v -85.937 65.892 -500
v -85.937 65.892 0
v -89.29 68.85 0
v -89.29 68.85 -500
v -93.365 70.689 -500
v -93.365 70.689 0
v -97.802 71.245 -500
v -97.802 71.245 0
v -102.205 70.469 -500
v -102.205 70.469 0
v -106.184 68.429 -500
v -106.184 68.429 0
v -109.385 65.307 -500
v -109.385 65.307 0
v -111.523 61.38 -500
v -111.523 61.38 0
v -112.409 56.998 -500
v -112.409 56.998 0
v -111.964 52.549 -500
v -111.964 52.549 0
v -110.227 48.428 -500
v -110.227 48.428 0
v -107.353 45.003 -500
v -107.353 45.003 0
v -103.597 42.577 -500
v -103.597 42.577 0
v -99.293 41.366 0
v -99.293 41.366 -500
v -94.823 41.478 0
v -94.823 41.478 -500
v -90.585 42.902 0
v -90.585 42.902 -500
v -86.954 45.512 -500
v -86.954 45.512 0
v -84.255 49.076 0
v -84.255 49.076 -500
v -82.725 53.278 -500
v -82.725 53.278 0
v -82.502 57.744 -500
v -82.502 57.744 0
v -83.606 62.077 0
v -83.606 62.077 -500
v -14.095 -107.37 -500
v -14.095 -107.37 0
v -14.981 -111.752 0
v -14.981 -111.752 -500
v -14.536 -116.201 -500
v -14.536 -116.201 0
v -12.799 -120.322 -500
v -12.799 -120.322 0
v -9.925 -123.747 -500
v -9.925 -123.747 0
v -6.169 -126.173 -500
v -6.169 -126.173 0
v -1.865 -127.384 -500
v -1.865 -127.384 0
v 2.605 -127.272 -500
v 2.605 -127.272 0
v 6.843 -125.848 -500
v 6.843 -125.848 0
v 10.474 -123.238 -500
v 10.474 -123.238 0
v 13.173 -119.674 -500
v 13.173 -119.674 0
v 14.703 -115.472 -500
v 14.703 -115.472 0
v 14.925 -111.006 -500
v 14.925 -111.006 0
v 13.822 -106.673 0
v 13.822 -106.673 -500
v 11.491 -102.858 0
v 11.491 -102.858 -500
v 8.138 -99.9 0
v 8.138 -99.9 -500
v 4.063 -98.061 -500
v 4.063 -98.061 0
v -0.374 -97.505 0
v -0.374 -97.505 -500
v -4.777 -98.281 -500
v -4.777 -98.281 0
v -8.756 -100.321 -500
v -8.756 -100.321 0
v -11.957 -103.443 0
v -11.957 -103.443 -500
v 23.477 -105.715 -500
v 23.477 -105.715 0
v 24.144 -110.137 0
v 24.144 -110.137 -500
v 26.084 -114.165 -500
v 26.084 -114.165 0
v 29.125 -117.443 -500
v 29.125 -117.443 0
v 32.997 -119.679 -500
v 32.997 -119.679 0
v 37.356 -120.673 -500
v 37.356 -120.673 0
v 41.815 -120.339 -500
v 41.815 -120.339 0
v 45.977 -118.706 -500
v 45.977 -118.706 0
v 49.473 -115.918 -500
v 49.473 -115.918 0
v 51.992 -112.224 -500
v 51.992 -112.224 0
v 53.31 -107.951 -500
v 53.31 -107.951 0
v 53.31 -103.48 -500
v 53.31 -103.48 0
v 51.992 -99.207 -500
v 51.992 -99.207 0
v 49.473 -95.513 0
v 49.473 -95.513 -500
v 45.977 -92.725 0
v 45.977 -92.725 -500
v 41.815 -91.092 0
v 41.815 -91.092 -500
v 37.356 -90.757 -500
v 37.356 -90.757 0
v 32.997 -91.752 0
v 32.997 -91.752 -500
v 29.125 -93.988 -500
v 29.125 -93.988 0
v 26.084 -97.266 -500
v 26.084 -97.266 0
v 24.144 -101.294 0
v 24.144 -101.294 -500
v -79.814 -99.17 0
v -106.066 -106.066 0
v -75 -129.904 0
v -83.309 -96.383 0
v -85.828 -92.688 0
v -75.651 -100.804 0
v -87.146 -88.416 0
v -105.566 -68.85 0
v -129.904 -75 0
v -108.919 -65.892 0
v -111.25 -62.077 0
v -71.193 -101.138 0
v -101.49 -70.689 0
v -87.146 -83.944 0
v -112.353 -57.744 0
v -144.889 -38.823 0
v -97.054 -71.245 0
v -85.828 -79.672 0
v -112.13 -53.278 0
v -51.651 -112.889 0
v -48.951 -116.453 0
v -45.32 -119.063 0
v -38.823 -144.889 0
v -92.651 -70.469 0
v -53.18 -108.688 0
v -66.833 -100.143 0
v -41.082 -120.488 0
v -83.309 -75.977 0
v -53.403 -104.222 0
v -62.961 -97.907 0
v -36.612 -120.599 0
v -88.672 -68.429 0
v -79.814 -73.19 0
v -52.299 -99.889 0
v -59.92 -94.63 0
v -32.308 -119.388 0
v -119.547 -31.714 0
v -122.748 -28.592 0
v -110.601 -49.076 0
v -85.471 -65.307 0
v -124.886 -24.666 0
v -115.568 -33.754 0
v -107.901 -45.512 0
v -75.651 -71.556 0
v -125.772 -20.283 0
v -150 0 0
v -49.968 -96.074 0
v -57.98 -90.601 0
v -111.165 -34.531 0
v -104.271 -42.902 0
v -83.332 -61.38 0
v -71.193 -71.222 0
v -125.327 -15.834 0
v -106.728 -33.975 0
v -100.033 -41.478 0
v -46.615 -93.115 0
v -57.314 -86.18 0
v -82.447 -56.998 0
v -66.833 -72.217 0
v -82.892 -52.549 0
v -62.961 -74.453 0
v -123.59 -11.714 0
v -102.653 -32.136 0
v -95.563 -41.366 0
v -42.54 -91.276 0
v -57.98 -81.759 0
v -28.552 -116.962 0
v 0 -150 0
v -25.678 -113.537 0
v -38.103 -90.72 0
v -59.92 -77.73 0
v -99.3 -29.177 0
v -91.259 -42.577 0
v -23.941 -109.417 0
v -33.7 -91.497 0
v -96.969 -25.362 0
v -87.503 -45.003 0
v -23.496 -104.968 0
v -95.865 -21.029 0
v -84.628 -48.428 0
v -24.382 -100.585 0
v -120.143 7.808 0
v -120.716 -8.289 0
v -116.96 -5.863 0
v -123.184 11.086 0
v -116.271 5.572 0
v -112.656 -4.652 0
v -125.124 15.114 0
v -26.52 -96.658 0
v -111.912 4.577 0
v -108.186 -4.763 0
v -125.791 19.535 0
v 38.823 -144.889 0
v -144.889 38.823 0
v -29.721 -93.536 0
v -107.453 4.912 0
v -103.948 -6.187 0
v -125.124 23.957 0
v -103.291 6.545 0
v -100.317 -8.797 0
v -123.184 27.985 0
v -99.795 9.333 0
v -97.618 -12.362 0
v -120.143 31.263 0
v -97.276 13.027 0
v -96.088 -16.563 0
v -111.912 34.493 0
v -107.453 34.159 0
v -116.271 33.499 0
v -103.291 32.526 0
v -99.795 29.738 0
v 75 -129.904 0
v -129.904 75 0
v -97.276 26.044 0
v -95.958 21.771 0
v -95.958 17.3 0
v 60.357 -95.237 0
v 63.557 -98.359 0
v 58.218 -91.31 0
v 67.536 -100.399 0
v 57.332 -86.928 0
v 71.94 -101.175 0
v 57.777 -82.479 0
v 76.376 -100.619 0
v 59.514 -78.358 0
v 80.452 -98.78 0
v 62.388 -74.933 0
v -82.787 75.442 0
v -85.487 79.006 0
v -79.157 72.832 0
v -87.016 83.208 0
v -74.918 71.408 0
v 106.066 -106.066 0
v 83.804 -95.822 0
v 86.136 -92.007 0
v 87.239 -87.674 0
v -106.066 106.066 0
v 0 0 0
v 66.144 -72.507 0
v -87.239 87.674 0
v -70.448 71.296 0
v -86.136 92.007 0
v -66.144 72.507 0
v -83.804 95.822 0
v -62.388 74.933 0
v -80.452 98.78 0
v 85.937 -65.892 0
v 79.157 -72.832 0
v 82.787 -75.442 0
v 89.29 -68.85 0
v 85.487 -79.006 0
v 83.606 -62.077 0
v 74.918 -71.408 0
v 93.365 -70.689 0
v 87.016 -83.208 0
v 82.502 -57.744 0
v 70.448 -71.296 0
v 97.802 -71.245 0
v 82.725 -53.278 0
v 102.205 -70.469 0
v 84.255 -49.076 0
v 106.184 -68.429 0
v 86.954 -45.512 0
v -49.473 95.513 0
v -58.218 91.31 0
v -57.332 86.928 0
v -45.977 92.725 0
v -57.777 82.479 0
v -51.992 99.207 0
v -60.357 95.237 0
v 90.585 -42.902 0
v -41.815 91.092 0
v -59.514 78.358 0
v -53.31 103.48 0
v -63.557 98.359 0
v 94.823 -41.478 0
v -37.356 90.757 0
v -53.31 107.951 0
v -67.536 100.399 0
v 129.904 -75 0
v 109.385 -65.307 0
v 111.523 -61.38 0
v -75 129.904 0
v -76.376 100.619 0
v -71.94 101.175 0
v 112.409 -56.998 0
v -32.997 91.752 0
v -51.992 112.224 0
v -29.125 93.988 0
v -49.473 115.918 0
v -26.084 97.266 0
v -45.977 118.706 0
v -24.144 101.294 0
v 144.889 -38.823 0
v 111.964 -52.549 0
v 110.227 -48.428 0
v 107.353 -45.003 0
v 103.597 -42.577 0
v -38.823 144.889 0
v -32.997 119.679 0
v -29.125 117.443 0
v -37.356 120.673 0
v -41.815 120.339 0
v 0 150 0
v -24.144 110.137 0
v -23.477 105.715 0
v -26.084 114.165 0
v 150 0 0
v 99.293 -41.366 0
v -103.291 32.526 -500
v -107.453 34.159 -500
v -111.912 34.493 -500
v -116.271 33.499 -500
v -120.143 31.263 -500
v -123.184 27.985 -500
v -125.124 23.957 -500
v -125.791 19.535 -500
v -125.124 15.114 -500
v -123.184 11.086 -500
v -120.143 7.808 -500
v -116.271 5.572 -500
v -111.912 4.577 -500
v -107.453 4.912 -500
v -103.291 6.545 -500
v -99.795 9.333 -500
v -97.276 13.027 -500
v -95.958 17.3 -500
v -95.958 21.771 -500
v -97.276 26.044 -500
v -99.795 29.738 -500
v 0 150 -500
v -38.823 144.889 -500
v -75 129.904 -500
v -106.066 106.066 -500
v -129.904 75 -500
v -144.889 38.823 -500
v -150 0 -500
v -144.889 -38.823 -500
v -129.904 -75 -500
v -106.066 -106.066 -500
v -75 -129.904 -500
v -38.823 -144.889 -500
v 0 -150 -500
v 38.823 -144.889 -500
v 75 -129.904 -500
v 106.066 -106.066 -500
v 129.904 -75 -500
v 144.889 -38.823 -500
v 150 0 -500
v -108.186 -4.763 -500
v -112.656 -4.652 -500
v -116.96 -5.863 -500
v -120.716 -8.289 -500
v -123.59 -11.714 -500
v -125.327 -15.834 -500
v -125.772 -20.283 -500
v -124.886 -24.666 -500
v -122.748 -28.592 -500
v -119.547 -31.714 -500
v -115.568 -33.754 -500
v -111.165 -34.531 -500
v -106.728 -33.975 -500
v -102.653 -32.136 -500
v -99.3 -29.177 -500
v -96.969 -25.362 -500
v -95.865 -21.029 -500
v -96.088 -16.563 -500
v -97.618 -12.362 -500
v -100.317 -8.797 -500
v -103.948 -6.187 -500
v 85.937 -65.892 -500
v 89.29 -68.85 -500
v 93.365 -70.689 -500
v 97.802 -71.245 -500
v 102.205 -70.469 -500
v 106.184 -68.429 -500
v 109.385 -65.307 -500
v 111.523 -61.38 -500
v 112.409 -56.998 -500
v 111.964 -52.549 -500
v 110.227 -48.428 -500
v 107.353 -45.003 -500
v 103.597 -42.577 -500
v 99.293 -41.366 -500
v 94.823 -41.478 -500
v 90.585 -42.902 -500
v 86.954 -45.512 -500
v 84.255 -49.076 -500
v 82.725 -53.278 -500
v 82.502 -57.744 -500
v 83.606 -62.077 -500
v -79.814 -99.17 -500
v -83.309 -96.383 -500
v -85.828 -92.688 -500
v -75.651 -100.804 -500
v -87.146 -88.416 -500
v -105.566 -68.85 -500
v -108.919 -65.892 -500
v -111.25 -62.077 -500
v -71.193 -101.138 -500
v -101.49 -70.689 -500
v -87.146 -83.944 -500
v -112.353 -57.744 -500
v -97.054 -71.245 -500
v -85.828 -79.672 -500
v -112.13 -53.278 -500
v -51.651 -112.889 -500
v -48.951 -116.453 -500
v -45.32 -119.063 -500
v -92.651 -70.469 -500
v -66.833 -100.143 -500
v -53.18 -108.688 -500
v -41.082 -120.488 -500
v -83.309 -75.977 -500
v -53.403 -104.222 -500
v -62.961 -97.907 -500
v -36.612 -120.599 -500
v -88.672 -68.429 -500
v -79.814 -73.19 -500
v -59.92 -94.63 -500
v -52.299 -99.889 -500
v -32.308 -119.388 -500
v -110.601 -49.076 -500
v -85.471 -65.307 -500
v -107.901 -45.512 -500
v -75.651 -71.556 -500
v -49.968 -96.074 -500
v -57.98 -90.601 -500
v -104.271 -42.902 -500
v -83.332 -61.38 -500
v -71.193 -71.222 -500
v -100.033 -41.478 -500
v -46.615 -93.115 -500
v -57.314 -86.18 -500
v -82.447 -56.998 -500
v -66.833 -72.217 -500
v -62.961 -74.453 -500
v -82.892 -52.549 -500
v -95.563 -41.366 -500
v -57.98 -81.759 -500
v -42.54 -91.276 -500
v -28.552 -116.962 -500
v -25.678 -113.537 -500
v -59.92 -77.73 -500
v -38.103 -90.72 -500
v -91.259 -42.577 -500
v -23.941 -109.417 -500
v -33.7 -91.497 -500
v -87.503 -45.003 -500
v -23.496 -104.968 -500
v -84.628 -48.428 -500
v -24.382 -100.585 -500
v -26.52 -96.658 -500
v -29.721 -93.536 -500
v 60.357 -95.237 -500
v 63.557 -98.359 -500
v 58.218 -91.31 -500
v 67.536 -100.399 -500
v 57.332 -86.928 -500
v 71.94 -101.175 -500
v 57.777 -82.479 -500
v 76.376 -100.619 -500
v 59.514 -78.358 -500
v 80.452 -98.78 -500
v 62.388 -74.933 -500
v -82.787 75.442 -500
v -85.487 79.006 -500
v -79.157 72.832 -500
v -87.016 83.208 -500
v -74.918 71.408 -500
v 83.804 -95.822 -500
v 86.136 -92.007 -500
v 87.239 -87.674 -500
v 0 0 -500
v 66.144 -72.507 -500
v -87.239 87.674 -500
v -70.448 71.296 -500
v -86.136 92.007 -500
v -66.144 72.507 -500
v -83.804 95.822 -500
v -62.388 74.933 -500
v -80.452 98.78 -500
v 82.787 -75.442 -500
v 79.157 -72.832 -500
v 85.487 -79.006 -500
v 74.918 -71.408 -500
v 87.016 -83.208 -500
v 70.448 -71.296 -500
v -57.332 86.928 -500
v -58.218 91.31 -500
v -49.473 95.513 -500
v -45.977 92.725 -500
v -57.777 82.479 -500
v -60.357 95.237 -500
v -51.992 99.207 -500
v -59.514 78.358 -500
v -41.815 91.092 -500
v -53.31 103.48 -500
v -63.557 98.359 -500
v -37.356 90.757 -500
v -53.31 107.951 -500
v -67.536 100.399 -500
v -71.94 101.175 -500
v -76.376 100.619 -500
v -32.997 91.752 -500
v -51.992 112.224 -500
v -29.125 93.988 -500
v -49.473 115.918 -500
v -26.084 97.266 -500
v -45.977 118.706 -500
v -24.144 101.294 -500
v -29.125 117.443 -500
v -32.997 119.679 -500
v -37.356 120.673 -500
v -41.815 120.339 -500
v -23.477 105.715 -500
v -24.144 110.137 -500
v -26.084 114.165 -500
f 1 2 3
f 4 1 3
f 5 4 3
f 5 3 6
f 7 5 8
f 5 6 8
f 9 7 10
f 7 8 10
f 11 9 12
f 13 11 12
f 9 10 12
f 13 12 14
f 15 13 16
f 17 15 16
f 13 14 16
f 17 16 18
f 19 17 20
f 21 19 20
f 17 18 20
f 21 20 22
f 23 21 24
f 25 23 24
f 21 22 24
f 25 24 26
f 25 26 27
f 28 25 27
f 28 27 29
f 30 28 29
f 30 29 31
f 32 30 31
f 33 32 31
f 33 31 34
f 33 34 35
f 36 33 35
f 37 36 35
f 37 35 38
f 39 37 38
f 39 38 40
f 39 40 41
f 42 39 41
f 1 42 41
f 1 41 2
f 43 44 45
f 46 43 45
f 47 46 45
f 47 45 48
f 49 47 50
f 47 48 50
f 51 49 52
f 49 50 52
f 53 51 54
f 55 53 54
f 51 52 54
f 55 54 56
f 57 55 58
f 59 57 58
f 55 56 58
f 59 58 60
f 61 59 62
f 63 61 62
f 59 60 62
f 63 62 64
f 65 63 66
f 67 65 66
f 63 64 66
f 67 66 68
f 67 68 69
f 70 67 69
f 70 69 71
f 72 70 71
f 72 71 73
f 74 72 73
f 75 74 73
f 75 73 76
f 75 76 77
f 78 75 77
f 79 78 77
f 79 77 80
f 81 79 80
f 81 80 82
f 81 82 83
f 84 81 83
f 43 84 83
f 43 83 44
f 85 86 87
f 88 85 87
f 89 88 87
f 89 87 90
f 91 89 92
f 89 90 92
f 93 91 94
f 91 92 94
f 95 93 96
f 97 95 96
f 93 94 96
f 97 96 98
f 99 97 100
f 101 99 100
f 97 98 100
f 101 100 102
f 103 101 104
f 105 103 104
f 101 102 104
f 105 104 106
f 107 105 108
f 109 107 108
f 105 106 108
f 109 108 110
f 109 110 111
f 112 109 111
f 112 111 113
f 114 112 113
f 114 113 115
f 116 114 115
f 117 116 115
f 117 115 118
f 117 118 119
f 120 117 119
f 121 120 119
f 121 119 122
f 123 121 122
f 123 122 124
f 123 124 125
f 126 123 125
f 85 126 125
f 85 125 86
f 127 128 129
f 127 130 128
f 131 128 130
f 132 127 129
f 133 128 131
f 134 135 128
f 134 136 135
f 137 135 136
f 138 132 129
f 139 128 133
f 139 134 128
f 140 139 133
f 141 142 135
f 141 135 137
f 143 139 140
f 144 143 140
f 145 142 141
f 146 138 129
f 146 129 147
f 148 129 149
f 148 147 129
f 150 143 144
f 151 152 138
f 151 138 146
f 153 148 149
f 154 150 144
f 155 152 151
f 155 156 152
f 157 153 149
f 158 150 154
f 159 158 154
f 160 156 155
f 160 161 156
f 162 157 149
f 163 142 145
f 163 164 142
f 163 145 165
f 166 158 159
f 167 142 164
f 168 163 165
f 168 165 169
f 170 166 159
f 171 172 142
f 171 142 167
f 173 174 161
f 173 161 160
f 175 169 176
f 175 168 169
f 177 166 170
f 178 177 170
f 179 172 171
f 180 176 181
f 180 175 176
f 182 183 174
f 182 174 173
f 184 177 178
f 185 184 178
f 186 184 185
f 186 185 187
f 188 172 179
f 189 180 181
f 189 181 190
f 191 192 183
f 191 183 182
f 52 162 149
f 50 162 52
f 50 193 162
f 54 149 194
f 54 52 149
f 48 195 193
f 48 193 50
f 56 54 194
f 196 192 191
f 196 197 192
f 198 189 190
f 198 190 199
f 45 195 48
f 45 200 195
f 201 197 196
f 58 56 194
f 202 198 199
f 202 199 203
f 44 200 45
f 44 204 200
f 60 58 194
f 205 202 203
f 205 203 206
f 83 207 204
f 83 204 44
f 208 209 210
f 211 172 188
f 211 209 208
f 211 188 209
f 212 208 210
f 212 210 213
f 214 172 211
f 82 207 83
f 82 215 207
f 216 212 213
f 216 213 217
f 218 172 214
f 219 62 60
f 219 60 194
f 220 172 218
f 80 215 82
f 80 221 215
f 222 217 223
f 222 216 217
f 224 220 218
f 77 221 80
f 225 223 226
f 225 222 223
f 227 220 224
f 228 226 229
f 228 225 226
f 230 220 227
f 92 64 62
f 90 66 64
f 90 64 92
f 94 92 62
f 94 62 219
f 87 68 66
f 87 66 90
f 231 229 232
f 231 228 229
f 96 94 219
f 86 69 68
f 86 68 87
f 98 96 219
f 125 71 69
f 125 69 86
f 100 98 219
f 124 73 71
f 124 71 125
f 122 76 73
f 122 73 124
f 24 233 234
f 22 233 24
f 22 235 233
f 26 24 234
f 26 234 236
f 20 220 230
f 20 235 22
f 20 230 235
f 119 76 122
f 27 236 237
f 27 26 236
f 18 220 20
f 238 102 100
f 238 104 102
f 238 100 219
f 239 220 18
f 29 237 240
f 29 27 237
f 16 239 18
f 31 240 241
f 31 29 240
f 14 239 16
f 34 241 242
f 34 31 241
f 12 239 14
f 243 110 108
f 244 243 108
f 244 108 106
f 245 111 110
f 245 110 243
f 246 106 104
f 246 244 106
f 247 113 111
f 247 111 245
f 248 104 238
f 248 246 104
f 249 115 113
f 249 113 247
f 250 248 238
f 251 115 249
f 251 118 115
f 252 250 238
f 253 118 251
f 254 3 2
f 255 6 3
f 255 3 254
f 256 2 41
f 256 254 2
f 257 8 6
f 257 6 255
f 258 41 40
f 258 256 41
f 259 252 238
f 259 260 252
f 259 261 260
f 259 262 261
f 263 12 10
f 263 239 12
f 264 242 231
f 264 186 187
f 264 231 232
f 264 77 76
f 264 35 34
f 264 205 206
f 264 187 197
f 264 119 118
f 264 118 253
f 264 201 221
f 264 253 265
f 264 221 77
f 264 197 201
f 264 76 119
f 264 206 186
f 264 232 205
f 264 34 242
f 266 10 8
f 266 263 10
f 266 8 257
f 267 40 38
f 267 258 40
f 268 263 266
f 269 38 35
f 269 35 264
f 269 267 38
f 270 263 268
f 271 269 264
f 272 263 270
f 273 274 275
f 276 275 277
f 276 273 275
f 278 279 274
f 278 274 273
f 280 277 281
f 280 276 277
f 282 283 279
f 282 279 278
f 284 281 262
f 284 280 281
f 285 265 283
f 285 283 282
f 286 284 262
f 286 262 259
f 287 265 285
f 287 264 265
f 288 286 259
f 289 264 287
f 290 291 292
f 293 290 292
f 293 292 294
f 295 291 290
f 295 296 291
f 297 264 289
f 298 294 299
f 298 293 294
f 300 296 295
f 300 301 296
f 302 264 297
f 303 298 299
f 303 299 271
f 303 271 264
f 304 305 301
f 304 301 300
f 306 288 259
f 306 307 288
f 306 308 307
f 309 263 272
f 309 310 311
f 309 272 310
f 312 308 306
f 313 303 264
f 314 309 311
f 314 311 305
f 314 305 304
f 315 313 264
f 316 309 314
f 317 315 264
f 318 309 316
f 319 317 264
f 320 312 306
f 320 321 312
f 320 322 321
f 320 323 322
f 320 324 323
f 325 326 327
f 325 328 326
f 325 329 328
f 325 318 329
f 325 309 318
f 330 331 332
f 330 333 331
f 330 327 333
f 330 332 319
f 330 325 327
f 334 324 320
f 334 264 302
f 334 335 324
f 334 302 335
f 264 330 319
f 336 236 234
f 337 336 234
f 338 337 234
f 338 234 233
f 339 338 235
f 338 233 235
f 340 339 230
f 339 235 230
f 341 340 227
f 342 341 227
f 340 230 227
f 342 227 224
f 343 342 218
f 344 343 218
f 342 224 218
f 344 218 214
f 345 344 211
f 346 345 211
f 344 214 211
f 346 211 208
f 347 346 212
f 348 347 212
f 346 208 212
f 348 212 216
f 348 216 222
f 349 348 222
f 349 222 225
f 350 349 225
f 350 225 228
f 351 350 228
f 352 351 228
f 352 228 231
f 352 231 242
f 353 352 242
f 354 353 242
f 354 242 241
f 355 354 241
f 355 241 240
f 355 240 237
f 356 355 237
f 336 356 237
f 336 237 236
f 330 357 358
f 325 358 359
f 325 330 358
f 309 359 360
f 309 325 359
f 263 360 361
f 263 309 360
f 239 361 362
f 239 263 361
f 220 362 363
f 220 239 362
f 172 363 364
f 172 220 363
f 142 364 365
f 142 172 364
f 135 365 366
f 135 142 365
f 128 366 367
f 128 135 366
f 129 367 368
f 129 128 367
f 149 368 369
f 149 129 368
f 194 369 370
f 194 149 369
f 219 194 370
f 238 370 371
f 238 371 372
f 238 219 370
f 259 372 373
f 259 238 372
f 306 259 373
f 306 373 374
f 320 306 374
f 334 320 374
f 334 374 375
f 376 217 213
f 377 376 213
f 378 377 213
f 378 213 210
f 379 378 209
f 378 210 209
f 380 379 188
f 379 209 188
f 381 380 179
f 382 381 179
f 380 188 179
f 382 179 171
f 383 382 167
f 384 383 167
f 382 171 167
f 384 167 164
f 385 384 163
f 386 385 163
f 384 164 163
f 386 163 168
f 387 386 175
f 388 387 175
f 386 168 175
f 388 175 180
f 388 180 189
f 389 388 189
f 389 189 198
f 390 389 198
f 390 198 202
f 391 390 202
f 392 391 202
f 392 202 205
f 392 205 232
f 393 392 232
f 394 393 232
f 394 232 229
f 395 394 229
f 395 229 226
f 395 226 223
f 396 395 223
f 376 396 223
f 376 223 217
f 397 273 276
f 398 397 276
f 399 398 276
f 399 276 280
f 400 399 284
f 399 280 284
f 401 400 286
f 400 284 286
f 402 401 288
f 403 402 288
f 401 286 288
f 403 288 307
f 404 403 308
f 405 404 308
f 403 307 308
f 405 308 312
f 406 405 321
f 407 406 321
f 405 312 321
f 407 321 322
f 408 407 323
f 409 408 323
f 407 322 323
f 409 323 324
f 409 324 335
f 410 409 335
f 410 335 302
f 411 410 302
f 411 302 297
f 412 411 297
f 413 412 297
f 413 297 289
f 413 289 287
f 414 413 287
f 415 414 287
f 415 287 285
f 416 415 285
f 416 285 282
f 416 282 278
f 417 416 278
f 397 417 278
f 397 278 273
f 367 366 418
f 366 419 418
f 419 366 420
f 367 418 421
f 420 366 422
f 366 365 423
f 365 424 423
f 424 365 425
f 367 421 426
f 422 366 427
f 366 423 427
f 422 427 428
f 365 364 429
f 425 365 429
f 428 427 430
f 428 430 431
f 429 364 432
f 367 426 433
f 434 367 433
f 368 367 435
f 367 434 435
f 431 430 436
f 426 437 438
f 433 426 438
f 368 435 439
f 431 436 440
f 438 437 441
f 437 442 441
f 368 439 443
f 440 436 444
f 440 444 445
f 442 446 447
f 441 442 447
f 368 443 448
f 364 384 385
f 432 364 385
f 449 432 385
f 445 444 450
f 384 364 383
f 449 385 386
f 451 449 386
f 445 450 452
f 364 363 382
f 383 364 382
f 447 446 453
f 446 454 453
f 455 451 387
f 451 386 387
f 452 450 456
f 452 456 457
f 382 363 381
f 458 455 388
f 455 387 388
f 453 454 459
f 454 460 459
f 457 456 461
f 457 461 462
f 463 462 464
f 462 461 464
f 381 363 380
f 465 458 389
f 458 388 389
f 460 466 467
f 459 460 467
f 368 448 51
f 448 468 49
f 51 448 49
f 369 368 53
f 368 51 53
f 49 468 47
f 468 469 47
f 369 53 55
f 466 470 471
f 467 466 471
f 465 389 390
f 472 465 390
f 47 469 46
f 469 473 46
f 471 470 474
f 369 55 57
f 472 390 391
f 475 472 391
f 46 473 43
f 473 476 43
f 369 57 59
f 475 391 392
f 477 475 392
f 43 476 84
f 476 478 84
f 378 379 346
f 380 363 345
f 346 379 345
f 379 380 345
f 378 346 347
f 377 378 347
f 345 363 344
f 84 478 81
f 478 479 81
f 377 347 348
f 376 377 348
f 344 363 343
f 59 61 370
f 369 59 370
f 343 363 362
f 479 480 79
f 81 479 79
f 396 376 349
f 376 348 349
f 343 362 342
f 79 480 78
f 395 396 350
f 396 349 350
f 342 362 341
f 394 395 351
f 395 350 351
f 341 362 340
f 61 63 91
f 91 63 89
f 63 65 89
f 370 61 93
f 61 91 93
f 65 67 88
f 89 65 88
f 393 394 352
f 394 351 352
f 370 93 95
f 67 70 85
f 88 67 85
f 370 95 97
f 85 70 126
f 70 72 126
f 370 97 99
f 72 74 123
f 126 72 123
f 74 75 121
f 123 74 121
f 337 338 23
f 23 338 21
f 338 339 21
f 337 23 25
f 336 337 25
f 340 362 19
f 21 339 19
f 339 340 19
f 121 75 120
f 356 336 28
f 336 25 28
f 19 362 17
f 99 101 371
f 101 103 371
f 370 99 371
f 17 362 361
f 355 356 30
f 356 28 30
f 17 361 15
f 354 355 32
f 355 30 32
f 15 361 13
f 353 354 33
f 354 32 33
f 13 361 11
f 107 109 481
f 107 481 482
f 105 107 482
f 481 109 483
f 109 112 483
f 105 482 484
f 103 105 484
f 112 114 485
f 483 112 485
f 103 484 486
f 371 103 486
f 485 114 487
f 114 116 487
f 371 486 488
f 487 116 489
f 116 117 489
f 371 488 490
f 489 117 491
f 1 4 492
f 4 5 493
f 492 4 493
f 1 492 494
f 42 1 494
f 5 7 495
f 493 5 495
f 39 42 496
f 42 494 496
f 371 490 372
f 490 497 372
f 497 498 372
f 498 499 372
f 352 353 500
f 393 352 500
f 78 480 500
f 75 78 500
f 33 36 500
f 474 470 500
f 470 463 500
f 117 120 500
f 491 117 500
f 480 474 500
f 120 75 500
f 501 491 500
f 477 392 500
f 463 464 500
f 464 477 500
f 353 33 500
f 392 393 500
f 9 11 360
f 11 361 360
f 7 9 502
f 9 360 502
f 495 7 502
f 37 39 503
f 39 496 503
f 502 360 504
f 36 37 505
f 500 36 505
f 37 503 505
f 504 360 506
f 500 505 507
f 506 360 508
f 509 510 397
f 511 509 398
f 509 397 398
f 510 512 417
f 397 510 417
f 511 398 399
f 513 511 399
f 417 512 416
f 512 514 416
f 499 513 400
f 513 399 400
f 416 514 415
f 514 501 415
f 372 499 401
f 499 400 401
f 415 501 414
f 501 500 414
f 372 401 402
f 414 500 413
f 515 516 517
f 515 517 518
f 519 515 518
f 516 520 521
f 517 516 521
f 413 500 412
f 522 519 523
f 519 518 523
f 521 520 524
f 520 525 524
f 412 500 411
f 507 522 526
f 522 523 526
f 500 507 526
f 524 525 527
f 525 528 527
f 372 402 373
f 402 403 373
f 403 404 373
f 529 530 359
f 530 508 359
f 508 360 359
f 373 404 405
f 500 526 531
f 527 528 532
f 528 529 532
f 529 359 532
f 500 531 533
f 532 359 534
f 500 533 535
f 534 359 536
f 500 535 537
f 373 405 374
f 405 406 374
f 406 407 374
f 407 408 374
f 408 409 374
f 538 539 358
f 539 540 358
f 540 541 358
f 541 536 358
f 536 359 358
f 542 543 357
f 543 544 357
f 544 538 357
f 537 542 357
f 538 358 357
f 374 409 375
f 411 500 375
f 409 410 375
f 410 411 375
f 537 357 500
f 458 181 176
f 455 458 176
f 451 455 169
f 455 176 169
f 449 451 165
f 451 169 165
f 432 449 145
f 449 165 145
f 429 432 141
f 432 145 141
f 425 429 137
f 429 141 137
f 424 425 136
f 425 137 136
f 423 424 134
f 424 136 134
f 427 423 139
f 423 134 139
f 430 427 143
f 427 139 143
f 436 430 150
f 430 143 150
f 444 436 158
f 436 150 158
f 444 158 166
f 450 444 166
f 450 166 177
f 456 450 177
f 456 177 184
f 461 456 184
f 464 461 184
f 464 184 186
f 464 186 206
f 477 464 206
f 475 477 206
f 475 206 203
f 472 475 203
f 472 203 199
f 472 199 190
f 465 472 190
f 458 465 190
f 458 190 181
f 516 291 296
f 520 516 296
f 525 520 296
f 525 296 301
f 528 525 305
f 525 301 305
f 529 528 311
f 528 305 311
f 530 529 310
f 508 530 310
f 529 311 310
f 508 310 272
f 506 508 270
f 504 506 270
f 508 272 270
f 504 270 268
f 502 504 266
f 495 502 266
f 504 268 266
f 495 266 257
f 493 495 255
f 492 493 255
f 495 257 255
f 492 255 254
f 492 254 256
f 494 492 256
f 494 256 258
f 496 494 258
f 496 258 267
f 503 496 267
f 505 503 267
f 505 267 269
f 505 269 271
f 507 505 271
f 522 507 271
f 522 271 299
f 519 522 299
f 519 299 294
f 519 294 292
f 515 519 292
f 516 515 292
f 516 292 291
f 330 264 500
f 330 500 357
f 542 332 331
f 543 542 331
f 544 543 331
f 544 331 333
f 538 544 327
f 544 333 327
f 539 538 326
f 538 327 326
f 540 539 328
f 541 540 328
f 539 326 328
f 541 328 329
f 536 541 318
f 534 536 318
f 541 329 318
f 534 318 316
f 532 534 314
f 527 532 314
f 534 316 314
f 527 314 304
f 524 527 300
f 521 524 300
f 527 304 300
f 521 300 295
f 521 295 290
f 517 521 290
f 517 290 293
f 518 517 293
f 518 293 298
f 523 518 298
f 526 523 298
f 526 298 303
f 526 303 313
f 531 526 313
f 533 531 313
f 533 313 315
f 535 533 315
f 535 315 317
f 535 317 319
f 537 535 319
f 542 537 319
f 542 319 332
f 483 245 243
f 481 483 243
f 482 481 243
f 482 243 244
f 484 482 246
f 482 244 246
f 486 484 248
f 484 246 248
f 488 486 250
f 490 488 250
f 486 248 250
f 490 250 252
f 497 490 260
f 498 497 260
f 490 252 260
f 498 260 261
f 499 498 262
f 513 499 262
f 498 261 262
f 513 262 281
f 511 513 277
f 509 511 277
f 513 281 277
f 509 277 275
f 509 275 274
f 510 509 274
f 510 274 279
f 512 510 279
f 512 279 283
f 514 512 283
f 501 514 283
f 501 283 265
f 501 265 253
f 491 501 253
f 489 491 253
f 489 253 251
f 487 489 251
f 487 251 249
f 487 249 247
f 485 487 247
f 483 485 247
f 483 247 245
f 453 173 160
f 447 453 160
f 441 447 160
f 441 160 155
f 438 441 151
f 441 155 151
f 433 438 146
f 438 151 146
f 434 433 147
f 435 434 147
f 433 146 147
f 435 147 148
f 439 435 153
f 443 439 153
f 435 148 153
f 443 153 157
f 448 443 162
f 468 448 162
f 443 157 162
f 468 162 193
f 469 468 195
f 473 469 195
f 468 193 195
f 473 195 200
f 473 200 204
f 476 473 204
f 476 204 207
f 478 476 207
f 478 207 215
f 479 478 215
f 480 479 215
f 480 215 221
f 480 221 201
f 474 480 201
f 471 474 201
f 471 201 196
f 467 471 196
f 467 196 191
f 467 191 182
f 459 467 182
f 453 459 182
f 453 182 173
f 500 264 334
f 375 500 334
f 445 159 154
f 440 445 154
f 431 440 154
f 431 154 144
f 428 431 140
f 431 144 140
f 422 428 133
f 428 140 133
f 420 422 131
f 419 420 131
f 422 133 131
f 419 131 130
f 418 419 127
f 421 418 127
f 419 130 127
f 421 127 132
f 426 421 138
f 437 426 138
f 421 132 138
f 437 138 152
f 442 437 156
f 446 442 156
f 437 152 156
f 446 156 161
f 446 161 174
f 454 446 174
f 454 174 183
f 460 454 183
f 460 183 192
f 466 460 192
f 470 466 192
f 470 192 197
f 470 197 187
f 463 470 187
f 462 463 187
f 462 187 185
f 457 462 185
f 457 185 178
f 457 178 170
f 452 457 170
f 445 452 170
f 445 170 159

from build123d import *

# Parameters (mm, degrees)
SKETCH1_R           = 150
BOSS_EXTRUDE1_DEPTH = 500
SKETCH2_W           = 150
SKETCH2_H           = 150
CUT_EXTRUDE1_DEPTH  = 544.13902456
SKETCH3_R           = 15
CUT_EXTRUDE2_DEPTH  = 544.13902456
CIRPATTERN1_COUNT   = 12
CIRPATTERN1_ANGLE   = 220


with BuildPart() as part:
    # Sketch1 → Boss-Extrude1 (new body)
    with BuildSketch(Plane.XY):
        Circle(SKETCH1_R)
    extrude(amount=-BOSS_EXTRUDE1_DEPTH)

    # Sketch2 → Cut-Extrude1 (cut, through all)
    with BuildSketch(Plane.XY):
        with Locations((75, 75)):
            Rectangle(SKETCH2_W, SKETCH2_H)
    extrude(amount=-CUT_EXTRUDE1_DEPTH, mode=Mode.SUBTRACT)

    # Sketch3 → Cut-Extrude2 (cut, through all)
    with BuildSketch(Plane.XY):
        with Locations((-38.477266124, 105.715419838)):
            Circle(SKETCH3_R)
    cut_extrude2 = extrude(amount=-CUT_EXTRUDE2_DEPTH, mode=Mode.SUBTRACT)

    # CirPattern1: Cut-Extrude2 ×12 about axis
    cirpattern1_axis = Axis((0, 0, 0), (0, 0, 1))
    for i in range(1, CIRPATTERN1_COUNT):
        add(cut_extrude2.rotate(cirpattern1_axis, i * CIRPATTERN1_ANGLE / (CIRPATTERN1_COUNT - 1)), mode=Mode.SUBTRACT)


solid = part.part
